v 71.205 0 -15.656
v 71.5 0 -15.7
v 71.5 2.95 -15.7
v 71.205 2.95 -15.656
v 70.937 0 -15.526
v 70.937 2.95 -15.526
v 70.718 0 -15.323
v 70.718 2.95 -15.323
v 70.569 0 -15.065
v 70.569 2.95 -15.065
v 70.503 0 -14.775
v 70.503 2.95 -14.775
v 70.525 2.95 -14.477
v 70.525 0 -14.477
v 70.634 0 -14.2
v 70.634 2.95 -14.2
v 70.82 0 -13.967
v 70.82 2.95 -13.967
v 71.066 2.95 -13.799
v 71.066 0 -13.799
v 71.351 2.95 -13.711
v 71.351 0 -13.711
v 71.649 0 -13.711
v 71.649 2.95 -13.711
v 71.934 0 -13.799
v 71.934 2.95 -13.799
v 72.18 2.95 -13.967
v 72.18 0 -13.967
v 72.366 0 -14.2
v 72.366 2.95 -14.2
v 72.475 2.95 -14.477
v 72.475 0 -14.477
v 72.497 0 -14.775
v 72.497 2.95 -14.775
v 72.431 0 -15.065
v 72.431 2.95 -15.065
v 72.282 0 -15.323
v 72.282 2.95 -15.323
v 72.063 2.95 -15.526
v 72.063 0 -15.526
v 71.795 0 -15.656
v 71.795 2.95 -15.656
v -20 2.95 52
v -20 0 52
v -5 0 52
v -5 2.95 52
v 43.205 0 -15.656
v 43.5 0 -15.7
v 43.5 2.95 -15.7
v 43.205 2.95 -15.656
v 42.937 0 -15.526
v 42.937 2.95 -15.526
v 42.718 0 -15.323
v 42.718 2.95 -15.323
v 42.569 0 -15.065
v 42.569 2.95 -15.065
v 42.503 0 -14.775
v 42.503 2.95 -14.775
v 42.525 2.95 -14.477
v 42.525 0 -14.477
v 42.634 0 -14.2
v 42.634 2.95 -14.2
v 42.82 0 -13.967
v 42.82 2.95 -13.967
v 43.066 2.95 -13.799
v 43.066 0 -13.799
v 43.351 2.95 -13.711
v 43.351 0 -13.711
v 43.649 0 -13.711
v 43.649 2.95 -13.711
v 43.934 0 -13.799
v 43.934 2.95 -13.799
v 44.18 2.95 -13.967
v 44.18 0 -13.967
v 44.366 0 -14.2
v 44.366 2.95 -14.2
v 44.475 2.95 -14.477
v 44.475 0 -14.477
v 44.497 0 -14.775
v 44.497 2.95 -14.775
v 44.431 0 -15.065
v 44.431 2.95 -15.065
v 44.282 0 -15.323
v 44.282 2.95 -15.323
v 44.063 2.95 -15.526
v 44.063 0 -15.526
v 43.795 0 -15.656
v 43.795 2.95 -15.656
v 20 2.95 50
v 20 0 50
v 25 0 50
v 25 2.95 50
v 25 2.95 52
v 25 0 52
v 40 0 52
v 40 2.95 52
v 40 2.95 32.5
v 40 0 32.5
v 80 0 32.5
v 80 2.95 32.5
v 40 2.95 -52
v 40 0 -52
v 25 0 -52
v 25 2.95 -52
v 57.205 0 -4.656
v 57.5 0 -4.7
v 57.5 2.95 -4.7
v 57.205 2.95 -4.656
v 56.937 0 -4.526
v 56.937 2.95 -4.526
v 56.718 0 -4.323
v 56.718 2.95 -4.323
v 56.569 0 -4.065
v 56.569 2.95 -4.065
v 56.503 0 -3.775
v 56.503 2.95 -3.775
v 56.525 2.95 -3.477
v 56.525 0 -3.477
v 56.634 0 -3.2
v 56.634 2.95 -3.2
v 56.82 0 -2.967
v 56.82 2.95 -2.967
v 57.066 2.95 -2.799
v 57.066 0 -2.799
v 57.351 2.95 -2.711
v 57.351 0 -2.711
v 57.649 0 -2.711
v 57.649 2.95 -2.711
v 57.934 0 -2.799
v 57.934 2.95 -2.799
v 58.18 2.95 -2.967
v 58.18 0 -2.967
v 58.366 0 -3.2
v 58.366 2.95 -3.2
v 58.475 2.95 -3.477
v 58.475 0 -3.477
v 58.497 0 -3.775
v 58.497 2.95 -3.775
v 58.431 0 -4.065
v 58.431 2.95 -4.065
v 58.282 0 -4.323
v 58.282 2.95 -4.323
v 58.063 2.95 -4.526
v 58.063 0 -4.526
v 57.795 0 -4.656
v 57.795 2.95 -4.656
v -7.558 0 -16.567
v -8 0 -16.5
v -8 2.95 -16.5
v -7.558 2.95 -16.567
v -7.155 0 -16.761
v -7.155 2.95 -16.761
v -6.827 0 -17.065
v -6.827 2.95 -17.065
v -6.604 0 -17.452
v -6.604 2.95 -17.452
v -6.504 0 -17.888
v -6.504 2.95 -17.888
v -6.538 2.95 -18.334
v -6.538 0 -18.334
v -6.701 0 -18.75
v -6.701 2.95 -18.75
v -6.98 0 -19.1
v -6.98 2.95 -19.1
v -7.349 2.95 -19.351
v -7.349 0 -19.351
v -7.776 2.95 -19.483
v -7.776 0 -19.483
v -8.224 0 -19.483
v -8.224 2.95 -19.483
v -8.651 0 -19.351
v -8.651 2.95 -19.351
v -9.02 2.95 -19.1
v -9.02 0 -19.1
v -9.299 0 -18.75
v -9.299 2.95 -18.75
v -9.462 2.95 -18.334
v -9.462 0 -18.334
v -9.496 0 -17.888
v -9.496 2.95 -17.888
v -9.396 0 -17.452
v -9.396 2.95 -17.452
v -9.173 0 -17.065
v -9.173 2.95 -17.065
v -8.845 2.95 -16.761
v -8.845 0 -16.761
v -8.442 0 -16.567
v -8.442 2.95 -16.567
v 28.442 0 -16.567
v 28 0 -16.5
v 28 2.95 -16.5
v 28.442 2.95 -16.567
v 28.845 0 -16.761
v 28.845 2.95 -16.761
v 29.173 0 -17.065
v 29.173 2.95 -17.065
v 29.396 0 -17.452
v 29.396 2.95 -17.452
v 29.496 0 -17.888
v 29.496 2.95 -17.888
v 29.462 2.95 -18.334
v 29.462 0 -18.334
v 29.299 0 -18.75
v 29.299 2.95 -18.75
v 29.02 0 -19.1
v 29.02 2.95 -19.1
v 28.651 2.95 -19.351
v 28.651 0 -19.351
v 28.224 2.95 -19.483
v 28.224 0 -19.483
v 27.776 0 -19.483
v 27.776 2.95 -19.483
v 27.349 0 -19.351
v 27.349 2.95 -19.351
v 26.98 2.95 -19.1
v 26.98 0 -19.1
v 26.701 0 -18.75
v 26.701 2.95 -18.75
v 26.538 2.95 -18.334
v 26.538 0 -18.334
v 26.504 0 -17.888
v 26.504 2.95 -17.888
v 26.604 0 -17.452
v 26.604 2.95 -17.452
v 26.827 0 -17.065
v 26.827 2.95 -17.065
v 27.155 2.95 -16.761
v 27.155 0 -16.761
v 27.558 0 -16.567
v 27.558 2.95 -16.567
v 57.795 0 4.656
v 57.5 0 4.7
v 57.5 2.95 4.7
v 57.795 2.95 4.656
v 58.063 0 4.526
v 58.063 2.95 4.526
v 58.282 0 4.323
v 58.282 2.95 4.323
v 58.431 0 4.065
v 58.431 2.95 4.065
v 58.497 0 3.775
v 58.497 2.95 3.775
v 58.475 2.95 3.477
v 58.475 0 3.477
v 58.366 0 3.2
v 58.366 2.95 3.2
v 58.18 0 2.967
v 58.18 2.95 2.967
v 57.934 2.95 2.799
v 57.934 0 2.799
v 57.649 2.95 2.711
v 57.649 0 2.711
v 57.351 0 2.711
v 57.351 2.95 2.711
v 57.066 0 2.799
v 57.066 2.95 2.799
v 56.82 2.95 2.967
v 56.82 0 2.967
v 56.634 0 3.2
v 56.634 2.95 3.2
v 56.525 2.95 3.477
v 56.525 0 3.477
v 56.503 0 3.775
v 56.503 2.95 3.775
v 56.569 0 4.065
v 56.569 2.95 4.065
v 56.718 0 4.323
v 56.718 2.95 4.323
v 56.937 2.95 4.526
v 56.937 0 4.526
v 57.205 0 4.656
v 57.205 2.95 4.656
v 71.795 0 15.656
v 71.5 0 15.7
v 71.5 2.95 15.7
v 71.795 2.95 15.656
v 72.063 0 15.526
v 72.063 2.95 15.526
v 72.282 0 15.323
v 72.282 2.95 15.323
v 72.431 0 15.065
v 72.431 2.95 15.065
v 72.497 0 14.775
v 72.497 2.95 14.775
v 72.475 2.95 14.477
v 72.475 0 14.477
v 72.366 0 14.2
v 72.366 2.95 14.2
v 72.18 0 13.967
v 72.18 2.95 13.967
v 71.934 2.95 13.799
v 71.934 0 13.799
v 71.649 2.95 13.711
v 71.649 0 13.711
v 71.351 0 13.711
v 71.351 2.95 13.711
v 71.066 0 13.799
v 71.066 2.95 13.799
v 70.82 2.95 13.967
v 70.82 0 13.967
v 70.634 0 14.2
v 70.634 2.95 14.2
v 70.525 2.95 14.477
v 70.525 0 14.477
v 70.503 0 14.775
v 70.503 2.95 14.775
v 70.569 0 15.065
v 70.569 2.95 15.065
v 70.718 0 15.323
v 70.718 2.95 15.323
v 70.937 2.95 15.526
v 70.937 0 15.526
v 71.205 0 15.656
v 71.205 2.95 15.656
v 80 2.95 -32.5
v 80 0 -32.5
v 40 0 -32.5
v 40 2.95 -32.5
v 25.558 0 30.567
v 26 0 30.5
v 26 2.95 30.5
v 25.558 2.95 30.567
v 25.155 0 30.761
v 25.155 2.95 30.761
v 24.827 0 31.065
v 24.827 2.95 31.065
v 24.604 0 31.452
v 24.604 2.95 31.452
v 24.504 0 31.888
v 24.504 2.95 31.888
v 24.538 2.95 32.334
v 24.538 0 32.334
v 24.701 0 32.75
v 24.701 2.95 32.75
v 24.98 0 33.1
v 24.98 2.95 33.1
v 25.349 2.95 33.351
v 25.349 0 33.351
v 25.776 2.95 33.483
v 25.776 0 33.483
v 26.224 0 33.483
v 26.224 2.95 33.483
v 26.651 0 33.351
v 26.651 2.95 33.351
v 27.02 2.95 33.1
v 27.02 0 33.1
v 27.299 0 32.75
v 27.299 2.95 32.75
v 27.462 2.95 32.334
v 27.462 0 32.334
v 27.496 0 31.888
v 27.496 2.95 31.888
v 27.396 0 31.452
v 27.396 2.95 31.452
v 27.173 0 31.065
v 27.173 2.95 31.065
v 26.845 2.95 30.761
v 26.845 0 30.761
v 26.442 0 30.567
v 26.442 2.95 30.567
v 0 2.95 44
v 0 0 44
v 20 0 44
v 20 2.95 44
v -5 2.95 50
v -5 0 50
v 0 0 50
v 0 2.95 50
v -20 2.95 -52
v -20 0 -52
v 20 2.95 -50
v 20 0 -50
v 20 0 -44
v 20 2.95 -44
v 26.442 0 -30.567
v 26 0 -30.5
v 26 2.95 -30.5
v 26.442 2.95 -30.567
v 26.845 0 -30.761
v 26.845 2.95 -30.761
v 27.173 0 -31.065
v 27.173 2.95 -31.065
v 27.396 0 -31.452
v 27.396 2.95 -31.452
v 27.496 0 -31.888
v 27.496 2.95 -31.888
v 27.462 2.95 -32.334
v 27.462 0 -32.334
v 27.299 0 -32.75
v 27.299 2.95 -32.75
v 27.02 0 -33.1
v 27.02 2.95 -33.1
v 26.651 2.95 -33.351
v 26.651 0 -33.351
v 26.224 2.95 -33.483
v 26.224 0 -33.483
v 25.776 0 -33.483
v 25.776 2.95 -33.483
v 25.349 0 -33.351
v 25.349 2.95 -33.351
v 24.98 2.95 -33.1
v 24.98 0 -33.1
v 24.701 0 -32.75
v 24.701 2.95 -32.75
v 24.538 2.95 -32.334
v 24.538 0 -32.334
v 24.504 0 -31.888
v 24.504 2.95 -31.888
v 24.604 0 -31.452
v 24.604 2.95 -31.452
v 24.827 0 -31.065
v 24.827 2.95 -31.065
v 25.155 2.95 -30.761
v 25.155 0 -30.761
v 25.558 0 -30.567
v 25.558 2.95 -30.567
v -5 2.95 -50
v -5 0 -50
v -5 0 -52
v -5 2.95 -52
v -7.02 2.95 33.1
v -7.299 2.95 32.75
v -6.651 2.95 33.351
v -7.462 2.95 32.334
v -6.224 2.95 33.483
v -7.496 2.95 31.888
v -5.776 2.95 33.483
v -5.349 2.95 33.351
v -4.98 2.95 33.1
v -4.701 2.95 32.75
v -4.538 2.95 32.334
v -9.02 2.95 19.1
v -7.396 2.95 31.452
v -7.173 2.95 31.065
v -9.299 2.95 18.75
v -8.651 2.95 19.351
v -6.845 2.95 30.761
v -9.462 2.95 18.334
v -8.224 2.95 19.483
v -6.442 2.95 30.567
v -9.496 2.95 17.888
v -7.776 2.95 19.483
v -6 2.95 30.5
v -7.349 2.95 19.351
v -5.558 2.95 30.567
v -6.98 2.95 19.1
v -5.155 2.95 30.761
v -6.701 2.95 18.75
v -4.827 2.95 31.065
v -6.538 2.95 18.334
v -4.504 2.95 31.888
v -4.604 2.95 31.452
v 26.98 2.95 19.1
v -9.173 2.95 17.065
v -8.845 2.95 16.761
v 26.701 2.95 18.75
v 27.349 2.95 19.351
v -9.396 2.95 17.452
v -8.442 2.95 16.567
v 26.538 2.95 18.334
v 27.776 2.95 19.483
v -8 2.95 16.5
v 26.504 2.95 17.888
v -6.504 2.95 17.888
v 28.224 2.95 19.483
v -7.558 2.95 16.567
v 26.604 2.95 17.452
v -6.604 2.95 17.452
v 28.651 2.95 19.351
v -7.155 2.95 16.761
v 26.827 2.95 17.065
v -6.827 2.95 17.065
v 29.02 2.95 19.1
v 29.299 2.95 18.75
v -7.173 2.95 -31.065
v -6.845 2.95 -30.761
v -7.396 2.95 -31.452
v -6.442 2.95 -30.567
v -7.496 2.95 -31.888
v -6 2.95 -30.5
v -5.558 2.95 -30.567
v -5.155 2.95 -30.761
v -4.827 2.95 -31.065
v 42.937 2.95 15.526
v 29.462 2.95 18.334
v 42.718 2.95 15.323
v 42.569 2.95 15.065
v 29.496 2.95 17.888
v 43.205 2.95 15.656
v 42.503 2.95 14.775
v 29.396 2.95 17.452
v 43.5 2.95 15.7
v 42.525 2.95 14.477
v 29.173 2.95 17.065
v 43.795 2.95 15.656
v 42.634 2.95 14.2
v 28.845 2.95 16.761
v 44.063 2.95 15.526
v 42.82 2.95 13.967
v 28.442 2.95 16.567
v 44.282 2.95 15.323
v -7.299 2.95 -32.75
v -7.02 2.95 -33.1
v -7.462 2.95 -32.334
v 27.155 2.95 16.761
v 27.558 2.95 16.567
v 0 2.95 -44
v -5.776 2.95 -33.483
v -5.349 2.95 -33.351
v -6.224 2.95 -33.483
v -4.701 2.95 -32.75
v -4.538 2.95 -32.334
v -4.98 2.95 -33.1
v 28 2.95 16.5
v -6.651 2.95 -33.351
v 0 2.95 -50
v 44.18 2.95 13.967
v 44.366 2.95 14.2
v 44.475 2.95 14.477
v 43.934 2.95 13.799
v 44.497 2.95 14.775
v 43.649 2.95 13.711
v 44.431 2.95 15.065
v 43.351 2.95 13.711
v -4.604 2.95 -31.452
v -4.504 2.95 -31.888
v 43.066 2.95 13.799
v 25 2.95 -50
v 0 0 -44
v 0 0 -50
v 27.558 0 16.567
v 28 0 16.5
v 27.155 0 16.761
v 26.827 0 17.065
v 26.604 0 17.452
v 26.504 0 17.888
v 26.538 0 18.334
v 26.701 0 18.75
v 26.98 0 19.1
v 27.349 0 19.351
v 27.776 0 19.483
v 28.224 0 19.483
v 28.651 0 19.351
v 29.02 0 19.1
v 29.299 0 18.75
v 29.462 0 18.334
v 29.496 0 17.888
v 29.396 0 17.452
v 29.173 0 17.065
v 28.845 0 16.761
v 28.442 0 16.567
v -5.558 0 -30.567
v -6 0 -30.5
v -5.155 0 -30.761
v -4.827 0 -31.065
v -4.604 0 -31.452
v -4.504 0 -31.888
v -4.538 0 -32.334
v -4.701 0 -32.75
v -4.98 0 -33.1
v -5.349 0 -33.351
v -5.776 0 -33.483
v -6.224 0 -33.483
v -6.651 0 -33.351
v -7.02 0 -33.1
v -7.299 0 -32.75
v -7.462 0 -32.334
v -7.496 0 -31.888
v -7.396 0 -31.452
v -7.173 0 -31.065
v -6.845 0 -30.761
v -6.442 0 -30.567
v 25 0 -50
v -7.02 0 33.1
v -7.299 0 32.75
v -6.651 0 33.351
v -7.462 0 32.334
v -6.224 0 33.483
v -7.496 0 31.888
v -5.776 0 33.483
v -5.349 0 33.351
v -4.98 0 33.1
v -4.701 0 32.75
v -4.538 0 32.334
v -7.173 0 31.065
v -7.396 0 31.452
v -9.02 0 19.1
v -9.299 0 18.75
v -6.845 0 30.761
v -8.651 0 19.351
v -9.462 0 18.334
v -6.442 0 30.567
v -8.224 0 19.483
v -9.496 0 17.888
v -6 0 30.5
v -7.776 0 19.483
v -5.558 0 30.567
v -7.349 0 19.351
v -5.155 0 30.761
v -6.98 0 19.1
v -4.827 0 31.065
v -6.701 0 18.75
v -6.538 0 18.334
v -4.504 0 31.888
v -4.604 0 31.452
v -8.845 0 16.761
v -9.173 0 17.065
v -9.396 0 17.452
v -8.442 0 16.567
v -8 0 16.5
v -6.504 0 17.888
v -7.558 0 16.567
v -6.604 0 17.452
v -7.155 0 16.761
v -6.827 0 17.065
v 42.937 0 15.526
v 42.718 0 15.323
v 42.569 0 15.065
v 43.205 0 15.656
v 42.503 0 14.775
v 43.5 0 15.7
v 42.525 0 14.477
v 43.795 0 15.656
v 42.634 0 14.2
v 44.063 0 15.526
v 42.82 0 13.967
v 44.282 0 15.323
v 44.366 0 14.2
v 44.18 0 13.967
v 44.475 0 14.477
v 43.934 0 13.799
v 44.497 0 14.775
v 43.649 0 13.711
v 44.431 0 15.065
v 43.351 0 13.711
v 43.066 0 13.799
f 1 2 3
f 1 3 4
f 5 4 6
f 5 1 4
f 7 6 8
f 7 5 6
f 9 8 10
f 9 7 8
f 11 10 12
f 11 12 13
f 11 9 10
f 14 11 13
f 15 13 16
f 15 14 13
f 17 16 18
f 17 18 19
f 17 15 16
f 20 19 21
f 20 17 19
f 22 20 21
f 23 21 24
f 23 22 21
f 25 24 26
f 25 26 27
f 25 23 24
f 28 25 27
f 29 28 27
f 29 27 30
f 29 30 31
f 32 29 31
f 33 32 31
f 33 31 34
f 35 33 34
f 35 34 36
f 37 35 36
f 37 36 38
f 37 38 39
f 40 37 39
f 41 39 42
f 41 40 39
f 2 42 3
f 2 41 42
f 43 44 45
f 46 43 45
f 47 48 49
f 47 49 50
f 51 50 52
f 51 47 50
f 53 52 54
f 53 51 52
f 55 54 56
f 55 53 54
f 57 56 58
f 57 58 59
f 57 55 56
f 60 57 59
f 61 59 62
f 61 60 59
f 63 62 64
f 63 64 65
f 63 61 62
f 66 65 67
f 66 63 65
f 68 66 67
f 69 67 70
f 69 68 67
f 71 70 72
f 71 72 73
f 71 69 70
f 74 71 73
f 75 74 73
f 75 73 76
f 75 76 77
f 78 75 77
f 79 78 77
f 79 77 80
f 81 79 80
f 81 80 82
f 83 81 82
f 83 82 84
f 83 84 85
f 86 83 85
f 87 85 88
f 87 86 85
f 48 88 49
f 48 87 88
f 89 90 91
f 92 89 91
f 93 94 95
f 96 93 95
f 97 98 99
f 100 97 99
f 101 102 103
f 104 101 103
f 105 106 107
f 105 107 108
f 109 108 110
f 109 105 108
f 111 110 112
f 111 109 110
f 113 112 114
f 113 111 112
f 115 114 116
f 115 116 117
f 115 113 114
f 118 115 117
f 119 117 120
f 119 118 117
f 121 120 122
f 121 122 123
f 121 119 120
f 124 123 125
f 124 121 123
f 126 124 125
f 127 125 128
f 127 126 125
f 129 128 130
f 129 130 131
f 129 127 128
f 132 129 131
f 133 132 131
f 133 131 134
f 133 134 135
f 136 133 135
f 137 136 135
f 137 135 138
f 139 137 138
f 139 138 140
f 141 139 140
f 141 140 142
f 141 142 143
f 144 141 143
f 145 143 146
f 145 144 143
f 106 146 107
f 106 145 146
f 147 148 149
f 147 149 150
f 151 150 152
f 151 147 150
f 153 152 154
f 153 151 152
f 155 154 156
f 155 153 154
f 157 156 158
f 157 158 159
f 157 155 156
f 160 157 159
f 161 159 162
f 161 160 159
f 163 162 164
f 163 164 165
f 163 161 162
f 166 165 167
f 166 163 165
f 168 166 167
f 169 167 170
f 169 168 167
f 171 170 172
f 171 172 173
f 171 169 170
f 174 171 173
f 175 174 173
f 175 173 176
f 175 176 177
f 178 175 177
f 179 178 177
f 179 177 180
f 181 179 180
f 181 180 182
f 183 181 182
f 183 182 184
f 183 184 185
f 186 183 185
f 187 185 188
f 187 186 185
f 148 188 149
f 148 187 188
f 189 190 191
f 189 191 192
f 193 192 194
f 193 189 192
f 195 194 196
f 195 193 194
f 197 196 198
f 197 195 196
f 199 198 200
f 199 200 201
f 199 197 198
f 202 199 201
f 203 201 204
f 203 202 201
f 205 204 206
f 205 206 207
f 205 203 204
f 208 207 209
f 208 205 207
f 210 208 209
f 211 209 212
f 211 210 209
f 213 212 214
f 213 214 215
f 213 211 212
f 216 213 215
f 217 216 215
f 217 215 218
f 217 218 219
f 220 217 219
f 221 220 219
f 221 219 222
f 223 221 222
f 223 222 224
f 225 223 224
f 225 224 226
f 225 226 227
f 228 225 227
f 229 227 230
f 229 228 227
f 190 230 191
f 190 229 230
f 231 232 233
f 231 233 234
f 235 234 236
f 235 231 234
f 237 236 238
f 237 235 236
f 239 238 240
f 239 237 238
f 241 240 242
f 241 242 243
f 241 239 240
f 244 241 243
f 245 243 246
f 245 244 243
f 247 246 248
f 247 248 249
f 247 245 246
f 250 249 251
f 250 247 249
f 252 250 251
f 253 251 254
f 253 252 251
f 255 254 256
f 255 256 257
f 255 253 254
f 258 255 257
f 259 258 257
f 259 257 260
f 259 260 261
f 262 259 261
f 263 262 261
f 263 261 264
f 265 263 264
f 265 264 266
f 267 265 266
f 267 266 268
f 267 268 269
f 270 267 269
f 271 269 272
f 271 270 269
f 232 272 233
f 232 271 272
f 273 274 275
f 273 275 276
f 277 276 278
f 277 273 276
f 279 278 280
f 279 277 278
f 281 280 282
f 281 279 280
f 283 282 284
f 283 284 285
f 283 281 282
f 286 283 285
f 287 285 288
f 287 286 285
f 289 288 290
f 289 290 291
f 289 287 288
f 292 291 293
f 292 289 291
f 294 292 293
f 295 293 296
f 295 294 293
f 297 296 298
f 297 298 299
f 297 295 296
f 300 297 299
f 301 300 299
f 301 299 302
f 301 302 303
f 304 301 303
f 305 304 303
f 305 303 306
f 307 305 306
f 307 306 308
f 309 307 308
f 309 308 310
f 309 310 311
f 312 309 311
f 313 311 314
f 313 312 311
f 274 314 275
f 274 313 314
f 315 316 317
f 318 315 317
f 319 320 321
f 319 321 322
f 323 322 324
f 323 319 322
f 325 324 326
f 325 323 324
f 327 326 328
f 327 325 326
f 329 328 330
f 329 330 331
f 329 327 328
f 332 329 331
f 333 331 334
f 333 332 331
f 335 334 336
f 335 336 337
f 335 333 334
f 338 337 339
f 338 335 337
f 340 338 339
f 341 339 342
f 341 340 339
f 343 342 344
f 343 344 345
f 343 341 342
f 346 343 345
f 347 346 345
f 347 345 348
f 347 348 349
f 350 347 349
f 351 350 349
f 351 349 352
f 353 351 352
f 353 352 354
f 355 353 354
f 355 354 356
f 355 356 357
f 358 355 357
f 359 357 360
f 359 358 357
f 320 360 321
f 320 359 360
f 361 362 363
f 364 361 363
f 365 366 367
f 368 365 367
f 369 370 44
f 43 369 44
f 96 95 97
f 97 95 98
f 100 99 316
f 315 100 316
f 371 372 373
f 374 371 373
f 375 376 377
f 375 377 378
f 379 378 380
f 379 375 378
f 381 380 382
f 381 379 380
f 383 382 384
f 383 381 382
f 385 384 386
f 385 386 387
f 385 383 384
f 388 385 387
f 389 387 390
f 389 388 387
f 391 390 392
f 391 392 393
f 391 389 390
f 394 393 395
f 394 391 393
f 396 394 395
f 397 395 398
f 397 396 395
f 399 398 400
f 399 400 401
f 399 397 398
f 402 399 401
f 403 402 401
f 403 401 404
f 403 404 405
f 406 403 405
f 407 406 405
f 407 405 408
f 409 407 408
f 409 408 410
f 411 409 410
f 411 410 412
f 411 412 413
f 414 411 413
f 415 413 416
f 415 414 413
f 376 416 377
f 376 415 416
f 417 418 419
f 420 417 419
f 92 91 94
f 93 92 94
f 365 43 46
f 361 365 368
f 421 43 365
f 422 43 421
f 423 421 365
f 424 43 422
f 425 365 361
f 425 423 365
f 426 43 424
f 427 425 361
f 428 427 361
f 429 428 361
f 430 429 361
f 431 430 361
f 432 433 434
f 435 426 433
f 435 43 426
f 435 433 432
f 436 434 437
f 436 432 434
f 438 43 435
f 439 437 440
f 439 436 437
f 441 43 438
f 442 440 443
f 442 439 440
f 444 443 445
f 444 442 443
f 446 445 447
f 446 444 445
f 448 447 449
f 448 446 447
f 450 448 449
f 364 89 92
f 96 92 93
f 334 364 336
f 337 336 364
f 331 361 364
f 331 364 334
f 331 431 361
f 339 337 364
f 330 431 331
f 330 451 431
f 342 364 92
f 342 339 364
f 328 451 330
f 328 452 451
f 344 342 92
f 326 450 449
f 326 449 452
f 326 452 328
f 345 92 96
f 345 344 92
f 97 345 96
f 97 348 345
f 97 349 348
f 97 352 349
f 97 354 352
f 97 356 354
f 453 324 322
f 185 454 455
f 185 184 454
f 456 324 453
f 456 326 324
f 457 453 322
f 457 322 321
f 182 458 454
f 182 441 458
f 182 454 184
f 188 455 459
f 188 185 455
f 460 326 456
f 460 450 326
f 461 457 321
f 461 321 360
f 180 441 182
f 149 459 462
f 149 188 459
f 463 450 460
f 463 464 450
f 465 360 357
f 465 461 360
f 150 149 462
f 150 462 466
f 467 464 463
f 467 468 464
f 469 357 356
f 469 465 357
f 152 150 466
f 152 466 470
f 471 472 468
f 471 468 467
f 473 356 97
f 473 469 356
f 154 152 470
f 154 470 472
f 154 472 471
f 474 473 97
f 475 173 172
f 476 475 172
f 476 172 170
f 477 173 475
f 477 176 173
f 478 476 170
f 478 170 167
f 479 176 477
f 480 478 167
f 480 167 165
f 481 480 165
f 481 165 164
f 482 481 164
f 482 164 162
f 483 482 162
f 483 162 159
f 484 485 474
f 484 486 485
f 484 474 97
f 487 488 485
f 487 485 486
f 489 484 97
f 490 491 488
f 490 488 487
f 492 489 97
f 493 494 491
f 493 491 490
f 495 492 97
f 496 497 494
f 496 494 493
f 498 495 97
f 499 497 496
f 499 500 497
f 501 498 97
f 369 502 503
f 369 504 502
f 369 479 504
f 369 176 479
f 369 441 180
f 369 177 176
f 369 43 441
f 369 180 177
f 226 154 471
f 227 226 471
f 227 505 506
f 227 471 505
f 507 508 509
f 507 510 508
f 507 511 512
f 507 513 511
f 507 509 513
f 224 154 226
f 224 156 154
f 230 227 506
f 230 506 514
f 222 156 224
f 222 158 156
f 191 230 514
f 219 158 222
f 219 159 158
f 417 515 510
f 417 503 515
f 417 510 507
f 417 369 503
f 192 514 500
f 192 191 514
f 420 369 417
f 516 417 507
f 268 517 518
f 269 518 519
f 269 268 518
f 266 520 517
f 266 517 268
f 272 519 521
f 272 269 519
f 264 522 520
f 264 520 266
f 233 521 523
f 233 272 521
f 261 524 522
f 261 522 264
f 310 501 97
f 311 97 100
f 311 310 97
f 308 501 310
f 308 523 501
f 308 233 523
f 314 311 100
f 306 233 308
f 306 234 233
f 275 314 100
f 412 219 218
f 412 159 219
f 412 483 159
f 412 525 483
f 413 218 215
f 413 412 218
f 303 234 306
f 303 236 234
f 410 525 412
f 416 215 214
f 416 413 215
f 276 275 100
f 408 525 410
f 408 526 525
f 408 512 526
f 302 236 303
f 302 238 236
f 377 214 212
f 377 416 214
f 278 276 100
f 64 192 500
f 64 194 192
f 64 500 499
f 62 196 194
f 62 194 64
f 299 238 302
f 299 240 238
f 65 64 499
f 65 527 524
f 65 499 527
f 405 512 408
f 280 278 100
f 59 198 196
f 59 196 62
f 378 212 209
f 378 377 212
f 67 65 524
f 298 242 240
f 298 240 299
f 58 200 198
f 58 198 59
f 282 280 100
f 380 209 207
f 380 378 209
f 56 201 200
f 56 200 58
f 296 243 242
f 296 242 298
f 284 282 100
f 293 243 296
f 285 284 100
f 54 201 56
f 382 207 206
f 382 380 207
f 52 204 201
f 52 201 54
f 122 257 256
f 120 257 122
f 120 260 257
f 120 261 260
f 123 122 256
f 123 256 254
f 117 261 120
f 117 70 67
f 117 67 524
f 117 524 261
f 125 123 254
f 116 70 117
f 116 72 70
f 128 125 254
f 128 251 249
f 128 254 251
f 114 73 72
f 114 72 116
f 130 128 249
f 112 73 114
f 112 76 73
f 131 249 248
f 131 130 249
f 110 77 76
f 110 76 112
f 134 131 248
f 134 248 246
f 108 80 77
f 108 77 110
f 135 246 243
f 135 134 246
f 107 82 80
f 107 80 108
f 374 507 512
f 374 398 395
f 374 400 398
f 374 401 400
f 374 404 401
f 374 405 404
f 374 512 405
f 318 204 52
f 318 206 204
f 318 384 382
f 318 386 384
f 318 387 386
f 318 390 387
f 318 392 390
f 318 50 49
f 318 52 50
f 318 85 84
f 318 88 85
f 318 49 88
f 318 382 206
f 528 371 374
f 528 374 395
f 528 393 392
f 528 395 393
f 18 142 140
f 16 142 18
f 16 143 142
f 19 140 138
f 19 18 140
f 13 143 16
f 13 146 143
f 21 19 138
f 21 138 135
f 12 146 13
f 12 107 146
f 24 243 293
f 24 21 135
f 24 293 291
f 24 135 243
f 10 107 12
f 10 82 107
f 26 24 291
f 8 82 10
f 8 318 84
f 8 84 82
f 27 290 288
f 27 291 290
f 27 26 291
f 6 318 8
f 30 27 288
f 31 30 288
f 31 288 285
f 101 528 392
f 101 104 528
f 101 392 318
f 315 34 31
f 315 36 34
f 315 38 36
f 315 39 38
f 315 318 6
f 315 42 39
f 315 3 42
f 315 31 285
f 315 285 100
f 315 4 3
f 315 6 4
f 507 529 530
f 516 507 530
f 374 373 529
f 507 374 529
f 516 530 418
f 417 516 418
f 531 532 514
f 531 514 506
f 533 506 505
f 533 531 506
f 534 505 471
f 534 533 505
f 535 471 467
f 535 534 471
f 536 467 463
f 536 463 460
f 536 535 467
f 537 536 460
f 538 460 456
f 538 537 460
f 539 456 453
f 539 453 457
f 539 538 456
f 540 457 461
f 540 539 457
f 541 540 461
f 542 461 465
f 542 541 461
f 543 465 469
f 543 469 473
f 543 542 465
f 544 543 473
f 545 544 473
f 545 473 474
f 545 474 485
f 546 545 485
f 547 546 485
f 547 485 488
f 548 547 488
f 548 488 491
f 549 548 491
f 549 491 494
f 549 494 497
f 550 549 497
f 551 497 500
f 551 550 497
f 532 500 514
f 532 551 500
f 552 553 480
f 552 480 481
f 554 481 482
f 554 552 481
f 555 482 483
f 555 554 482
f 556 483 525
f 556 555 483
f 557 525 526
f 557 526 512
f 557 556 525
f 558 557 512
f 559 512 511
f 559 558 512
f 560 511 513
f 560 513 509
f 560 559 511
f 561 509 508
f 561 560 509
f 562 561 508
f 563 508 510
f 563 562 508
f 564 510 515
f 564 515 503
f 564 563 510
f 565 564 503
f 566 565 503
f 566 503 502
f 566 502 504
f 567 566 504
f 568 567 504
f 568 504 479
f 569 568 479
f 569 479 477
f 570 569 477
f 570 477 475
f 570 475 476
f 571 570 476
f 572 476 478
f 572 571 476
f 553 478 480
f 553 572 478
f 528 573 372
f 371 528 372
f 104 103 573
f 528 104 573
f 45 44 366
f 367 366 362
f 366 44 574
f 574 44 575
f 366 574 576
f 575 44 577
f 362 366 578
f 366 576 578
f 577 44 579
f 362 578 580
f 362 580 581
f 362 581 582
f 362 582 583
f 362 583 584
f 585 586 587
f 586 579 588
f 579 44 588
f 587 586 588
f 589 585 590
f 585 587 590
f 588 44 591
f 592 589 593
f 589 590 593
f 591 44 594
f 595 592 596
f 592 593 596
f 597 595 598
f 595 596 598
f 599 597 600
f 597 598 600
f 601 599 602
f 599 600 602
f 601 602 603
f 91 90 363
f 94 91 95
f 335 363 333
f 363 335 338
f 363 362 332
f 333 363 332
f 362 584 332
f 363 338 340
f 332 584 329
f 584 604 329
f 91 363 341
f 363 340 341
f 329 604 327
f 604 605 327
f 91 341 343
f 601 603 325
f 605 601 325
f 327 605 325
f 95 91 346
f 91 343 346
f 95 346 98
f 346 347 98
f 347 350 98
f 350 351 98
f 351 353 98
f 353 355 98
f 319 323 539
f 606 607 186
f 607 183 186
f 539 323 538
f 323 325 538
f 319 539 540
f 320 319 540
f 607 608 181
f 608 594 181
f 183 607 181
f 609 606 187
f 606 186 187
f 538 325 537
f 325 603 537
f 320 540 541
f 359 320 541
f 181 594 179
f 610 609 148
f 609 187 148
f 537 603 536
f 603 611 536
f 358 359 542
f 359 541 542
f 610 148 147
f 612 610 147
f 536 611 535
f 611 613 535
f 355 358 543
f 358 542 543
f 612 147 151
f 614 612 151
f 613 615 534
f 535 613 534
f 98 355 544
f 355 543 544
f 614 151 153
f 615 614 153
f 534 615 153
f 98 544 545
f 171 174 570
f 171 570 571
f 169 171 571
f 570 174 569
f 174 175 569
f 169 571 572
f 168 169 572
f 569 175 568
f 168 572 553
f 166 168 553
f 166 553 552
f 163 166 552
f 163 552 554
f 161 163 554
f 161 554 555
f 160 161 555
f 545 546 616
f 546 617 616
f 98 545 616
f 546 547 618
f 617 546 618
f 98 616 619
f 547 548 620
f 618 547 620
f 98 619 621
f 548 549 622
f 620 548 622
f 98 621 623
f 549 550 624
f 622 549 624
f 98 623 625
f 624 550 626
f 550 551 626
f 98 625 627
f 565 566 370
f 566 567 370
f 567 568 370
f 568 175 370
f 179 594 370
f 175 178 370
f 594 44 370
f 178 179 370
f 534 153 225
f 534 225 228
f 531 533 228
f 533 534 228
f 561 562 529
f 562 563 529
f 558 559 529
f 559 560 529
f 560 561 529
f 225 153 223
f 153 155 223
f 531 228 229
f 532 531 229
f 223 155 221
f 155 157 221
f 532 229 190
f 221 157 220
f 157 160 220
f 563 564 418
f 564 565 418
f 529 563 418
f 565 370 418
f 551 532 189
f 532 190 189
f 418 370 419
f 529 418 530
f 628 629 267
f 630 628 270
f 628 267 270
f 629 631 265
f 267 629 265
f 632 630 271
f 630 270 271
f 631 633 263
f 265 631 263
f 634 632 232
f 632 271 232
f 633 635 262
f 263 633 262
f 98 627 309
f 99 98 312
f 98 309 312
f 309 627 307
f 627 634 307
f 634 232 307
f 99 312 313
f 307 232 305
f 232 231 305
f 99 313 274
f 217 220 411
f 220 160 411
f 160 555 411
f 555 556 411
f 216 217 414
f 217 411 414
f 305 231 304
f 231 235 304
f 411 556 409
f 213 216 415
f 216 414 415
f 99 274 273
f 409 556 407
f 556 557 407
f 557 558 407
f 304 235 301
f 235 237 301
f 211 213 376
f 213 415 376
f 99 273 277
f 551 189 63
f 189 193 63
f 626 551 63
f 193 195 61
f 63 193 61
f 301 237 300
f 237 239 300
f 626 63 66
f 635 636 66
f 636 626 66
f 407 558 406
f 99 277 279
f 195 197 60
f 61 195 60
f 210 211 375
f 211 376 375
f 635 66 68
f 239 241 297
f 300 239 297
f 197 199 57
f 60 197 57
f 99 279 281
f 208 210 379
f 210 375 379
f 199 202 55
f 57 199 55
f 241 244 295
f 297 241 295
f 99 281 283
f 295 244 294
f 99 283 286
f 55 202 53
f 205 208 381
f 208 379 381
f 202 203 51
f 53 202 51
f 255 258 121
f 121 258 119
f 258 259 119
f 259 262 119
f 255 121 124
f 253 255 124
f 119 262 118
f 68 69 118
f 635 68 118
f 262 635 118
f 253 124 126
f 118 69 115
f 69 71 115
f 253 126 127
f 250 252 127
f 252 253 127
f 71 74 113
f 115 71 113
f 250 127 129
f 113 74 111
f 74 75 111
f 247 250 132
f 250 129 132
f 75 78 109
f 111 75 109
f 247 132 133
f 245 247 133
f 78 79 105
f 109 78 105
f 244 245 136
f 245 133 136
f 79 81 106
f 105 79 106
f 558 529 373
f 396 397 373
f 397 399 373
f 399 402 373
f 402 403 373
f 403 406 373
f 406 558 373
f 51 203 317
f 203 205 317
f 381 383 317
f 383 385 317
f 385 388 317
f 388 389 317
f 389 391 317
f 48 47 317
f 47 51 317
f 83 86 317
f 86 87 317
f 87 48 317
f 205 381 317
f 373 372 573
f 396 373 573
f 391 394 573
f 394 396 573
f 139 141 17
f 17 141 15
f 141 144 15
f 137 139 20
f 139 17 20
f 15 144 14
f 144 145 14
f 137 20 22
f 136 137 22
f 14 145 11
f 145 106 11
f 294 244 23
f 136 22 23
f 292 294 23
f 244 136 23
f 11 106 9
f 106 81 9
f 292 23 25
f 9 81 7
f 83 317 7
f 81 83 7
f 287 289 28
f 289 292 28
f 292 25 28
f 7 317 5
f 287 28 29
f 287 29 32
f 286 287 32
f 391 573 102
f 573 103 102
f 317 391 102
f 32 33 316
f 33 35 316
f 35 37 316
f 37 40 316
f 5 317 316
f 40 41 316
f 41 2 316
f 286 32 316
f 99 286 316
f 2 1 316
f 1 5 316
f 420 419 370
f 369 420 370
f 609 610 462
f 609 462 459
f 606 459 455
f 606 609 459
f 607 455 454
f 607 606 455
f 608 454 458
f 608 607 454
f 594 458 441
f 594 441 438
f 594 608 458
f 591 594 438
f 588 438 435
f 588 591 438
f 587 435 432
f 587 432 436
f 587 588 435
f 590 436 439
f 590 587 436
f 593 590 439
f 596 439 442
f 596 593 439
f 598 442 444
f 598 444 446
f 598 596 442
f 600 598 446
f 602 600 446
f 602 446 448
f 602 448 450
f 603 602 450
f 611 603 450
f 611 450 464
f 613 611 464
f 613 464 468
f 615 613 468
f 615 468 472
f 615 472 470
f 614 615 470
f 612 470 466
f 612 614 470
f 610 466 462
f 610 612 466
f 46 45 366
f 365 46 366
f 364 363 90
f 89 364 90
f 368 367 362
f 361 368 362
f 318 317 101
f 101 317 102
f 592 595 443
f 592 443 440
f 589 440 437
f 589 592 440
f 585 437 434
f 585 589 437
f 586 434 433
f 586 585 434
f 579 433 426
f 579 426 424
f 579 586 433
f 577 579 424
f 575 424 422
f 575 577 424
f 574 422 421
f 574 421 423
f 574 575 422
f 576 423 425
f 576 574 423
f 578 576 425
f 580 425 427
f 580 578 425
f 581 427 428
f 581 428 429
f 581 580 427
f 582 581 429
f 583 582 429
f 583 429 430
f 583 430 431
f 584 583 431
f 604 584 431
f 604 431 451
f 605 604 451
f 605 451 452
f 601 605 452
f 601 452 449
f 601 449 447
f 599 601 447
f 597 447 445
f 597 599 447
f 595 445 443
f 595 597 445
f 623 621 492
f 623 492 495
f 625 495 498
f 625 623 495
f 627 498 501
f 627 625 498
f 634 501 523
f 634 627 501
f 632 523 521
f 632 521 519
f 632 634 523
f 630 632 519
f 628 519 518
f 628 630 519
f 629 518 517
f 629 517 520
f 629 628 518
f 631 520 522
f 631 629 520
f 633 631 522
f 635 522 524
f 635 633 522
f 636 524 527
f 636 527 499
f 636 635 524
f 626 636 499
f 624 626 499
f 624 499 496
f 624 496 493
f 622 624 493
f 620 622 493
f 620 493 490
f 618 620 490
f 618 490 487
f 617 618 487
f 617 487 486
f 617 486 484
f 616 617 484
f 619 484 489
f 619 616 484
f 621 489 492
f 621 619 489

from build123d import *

# Parameters (mm, degrees)
SKETCH_1_R      = 1
SKETCH_1_R_2    = 1.5
EXTRUDE_1_DEPTH = 2.95


with BuildPart() as part:
    # 草图1 → 凸台-拉伸1 (new body)
    with BuildSketch(Plane(origin=(0, 0, 0), x_dir=(1, 0, 0), z_dir=(0, 1, 0))):
        Polygon((25, 50), (20, 50), (20, 44), (0, 44), (0, 50), (-5, 50), (-5, 52), (-20, 52), (-20, 50), (-20, -50), (-20, -52), (-5, -52), (-5, -50), (0, -50), (0, -44), (20, -44), (20, -50), (25, -50), (25, -52), (40, -52), (40, -50), (40, -32.5), (70, -32.5), (80, -32.5), (80, -30), (80, 30), (80, 32.5), (70, 32.5), (40, 32.5), (40, 50), (40, 52), (25, 52), align=None)
        with Locations(Location((71.5, 14.7, 0), (0, 0, 90))):
            Circle(SKETCH_1_R, mode=Mode.SUBTRACT)
        with Locations(Location((43.5, 14.7, 0), (0, 0, 90))):
            Circle(SKETCH_1_R, mode=Mode.SUBTRACT)
        with Locations(Location((57.5, 3.7, 0), (0, 0, 90))):
            Circle(SKETCH_1_R, mode=Mode.SUBTRACT)
        with Locations(Location((26, 32, 0), (0, 0, 270))):
            Circle(SKETCH_1_R_2, mode=Mode.SUBTRACT)
        with Locations(Location((-6, 32, 0), (0, 0, 270))):
            Circle(SKETCH_1_R_2, mode=Mode.SUBTRACT)
        with Locations(Location((28, 18, 0), (0, 0, 270))):
            Circle(SKETCH_1_R_2, mode=Mode.SUBTRACT)
        with Locations(Location((-8, 18, 0), (0, 0, 270))):
            Circle(SKETCH_1_R_2, mode=Mode.SUBTRACT)
        with Locations(Location((-8, -18, 0), (0, 0, 90))):
            Circle(SKETCH_1_R_2, mode=Mode.SUBTRACT)
        with Locations(Location((28, -18, 0), (0, 0, 90))):
            Circle(SKETCH_1_R_2, mode=Mode.SUBTRACT)
        with Locations(Location((-6, -32, 0), (0, 0, 90))):
            Circle(SKETCH_1_R_2, mode=Mode.SUBTRACT)
        with Locations(Location((26, -32, 0), (0, 0, 90))):
            Circle(SKETCH_1_R_2, mode=Mode.SUBTRACT)
        with Locations(Location((57.5, -3.7, 0), (0, 0, 270))):
            Circle(SKETCH_1_R, mode=Mode.SUBTRACT)
        with Locations(Location((43.5, -14.7, 0), (0, 0, 270))):
            Circle(SKETCH_1_R, mode=Mode.SUBTRACT)
        with Locations(Location((71.5, -14.7, 0), (0, 0, 270))):
            Circle(SKETCH_1_R, mode=Mode.SUBTRACT)
    extrude(amount=EXTRUDE_1_DEPTH)


solid = part.part
